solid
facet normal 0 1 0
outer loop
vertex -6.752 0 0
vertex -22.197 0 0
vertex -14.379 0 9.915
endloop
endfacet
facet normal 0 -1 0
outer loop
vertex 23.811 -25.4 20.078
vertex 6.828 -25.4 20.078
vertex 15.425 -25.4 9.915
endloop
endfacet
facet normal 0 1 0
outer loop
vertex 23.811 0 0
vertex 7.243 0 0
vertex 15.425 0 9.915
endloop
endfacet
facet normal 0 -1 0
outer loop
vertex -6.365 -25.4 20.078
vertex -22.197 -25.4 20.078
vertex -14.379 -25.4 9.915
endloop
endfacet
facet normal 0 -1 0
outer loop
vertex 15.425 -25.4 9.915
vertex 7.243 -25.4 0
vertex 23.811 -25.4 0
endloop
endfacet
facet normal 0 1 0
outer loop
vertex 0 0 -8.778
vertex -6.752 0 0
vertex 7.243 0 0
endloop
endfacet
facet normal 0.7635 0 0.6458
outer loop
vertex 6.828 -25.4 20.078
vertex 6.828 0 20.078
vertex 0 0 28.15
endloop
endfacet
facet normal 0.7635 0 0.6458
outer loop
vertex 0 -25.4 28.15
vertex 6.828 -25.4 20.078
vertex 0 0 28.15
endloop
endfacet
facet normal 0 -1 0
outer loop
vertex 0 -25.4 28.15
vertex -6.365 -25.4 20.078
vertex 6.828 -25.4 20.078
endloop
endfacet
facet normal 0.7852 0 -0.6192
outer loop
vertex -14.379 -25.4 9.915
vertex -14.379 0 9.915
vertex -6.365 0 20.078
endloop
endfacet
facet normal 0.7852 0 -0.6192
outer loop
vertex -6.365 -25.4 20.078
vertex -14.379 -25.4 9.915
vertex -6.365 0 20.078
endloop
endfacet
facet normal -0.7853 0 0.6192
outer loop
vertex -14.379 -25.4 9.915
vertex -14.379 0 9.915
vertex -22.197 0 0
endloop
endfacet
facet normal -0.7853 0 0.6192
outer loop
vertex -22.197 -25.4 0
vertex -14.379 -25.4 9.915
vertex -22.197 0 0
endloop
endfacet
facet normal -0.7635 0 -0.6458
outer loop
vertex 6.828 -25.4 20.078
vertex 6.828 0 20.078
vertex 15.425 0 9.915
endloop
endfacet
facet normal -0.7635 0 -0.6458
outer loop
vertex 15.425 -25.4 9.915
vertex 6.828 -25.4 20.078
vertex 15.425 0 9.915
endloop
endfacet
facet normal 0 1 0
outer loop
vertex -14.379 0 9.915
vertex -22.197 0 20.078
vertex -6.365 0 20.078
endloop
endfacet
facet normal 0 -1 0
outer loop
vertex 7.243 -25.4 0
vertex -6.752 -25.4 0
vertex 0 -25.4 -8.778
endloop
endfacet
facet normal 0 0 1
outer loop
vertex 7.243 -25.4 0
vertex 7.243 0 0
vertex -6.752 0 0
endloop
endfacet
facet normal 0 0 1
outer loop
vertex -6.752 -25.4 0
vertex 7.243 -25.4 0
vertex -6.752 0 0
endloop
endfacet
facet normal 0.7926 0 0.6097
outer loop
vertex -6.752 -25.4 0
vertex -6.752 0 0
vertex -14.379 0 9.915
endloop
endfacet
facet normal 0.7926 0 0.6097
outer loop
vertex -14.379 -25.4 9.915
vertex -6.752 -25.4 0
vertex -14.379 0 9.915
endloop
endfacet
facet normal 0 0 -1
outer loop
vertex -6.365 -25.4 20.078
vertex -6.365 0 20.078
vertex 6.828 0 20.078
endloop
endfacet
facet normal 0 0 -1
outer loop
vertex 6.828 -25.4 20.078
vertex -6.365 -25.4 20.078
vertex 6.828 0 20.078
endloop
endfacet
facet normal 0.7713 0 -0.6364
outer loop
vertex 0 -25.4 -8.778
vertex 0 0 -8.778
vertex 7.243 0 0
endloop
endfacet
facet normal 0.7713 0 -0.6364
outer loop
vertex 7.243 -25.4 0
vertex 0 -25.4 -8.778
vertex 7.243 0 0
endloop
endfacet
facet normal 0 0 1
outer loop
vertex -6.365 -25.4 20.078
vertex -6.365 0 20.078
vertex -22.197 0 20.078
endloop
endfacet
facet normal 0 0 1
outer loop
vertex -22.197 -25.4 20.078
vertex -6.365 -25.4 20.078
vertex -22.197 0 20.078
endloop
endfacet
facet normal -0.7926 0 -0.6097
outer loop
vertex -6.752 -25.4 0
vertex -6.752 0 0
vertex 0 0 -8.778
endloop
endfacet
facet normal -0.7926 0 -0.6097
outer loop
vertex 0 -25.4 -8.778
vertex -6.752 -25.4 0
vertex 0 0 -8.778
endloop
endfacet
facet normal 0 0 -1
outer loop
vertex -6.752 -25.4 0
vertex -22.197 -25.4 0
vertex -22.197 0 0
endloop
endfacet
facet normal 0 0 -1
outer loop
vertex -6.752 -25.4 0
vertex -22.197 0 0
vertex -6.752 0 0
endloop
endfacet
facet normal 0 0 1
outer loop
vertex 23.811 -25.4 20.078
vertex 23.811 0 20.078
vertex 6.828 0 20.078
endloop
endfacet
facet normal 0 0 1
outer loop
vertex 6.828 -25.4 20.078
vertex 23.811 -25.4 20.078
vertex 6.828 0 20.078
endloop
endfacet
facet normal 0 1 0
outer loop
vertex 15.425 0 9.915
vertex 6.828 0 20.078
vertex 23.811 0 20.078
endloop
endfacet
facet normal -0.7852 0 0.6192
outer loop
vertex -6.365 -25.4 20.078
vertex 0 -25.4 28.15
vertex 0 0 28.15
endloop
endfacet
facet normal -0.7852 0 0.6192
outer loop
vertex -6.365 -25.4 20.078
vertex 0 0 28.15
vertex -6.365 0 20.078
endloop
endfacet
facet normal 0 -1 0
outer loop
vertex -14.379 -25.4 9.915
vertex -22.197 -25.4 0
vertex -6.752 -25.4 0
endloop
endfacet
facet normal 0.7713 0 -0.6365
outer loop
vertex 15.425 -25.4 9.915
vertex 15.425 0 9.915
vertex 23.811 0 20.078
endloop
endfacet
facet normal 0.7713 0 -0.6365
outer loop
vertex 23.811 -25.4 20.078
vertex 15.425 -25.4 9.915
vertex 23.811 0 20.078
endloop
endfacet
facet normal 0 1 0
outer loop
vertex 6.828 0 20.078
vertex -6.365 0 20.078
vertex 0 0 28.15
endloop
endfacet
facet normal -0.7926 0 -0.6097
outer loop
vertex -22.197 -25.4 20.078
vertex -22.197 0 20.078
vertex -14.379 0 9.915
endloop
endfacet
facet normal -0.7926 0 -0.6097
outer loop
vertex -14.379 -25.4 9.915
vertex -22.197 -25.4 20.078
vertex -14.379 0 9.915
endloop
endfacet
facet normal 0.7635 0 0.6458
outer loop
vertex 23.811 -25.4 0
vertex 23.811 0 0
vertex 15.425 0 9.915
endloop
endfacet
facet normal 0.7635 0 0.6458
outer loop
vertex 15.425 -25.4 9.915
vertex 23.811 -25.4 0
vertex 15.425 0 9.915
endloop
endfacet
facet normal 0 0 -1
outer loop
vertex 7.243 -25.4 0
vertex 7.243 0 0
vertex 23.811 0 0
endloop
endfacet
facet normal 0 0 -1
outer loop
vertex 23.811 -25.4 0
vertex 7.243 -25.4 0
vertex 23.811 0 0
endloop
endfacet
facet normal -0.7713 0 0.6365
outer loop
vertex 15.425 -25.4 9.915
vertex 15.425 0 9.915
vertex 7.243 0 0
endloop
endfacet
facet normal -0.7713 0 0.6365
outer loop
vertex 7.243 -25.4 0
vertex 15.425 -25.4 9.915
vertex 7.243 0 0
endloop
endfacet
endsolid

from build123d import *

# Parameters (mm, degrees)
F1_DEPTH = 25.4
F2_DEPTH = 25.4


with BuildPart() as f1:
    # F0 (on Front) → F1 (new body)
    with BuildSketch(Plane.XZ):
        Polygon((6.8276116135, 20.0781710446), (15.4246633988, 9.9147072672), (23.8112974912, 20.0781710446), align=None)
    extrude(amount=F1_DEPTH)


with BuildPart() as f1b:
    # F0 (on Front) → F1, piece 2 (new body)
    with BuildSketch(Plane.XZ):
        Polygon((0, -8.7778940797), (7.2432969075, 0), (-6.752226651, 0), align=None)
    extrude(amount=F1_DEPTH)


with BuildPart() as f1c:
    # F0 (on Front) → F1, piece 3 (new body)
    with BuildSketch(Plane.XZ):
        Polygon((-22.1969746053, 20.0781710446), (-14.3789250412, 9.9147072672), (-6.3647233695, 20.0781710446), align=None)
    extrude(amount=F1_DEPTH)


with BuildPart() as f2:
    # F0 (on Front) → F2 (new body)
    with BuildSketch(Plane.XZ):
        Polygon((-22.1969746053, 0), (-6.752226651, 0), (-14.3789250412, 9.9147072672), align=None)
    extrude(amount=F2_DEPTH)


with BuildPart() as f2b:
    # F0 (on Front) → F2, piece 2 (new body)
    with BuildSketch(Plane.XZ):
        Polygon((-6.3647233695, 20.0781710446), (6.8276116135, 20.0781710446), (0, 28.1497966498), align=None)
    extrude(amount=F2_DEPTH)


with BuildPart() as f2c:
    # F0 (on Front) → F2, piece 3 (new body)
    with BuildSketch(Plane.XZ):
        Polygon((7.2432969075, 0), (23.8112974912, 0), (15.4246633988, 9.9147072672), align=None)
    extrude(amount=F2_DEPTH)


solid = Compound([f1.part, f1b.part, f1c.part, f2.part, f2b.part, f2c.part])
